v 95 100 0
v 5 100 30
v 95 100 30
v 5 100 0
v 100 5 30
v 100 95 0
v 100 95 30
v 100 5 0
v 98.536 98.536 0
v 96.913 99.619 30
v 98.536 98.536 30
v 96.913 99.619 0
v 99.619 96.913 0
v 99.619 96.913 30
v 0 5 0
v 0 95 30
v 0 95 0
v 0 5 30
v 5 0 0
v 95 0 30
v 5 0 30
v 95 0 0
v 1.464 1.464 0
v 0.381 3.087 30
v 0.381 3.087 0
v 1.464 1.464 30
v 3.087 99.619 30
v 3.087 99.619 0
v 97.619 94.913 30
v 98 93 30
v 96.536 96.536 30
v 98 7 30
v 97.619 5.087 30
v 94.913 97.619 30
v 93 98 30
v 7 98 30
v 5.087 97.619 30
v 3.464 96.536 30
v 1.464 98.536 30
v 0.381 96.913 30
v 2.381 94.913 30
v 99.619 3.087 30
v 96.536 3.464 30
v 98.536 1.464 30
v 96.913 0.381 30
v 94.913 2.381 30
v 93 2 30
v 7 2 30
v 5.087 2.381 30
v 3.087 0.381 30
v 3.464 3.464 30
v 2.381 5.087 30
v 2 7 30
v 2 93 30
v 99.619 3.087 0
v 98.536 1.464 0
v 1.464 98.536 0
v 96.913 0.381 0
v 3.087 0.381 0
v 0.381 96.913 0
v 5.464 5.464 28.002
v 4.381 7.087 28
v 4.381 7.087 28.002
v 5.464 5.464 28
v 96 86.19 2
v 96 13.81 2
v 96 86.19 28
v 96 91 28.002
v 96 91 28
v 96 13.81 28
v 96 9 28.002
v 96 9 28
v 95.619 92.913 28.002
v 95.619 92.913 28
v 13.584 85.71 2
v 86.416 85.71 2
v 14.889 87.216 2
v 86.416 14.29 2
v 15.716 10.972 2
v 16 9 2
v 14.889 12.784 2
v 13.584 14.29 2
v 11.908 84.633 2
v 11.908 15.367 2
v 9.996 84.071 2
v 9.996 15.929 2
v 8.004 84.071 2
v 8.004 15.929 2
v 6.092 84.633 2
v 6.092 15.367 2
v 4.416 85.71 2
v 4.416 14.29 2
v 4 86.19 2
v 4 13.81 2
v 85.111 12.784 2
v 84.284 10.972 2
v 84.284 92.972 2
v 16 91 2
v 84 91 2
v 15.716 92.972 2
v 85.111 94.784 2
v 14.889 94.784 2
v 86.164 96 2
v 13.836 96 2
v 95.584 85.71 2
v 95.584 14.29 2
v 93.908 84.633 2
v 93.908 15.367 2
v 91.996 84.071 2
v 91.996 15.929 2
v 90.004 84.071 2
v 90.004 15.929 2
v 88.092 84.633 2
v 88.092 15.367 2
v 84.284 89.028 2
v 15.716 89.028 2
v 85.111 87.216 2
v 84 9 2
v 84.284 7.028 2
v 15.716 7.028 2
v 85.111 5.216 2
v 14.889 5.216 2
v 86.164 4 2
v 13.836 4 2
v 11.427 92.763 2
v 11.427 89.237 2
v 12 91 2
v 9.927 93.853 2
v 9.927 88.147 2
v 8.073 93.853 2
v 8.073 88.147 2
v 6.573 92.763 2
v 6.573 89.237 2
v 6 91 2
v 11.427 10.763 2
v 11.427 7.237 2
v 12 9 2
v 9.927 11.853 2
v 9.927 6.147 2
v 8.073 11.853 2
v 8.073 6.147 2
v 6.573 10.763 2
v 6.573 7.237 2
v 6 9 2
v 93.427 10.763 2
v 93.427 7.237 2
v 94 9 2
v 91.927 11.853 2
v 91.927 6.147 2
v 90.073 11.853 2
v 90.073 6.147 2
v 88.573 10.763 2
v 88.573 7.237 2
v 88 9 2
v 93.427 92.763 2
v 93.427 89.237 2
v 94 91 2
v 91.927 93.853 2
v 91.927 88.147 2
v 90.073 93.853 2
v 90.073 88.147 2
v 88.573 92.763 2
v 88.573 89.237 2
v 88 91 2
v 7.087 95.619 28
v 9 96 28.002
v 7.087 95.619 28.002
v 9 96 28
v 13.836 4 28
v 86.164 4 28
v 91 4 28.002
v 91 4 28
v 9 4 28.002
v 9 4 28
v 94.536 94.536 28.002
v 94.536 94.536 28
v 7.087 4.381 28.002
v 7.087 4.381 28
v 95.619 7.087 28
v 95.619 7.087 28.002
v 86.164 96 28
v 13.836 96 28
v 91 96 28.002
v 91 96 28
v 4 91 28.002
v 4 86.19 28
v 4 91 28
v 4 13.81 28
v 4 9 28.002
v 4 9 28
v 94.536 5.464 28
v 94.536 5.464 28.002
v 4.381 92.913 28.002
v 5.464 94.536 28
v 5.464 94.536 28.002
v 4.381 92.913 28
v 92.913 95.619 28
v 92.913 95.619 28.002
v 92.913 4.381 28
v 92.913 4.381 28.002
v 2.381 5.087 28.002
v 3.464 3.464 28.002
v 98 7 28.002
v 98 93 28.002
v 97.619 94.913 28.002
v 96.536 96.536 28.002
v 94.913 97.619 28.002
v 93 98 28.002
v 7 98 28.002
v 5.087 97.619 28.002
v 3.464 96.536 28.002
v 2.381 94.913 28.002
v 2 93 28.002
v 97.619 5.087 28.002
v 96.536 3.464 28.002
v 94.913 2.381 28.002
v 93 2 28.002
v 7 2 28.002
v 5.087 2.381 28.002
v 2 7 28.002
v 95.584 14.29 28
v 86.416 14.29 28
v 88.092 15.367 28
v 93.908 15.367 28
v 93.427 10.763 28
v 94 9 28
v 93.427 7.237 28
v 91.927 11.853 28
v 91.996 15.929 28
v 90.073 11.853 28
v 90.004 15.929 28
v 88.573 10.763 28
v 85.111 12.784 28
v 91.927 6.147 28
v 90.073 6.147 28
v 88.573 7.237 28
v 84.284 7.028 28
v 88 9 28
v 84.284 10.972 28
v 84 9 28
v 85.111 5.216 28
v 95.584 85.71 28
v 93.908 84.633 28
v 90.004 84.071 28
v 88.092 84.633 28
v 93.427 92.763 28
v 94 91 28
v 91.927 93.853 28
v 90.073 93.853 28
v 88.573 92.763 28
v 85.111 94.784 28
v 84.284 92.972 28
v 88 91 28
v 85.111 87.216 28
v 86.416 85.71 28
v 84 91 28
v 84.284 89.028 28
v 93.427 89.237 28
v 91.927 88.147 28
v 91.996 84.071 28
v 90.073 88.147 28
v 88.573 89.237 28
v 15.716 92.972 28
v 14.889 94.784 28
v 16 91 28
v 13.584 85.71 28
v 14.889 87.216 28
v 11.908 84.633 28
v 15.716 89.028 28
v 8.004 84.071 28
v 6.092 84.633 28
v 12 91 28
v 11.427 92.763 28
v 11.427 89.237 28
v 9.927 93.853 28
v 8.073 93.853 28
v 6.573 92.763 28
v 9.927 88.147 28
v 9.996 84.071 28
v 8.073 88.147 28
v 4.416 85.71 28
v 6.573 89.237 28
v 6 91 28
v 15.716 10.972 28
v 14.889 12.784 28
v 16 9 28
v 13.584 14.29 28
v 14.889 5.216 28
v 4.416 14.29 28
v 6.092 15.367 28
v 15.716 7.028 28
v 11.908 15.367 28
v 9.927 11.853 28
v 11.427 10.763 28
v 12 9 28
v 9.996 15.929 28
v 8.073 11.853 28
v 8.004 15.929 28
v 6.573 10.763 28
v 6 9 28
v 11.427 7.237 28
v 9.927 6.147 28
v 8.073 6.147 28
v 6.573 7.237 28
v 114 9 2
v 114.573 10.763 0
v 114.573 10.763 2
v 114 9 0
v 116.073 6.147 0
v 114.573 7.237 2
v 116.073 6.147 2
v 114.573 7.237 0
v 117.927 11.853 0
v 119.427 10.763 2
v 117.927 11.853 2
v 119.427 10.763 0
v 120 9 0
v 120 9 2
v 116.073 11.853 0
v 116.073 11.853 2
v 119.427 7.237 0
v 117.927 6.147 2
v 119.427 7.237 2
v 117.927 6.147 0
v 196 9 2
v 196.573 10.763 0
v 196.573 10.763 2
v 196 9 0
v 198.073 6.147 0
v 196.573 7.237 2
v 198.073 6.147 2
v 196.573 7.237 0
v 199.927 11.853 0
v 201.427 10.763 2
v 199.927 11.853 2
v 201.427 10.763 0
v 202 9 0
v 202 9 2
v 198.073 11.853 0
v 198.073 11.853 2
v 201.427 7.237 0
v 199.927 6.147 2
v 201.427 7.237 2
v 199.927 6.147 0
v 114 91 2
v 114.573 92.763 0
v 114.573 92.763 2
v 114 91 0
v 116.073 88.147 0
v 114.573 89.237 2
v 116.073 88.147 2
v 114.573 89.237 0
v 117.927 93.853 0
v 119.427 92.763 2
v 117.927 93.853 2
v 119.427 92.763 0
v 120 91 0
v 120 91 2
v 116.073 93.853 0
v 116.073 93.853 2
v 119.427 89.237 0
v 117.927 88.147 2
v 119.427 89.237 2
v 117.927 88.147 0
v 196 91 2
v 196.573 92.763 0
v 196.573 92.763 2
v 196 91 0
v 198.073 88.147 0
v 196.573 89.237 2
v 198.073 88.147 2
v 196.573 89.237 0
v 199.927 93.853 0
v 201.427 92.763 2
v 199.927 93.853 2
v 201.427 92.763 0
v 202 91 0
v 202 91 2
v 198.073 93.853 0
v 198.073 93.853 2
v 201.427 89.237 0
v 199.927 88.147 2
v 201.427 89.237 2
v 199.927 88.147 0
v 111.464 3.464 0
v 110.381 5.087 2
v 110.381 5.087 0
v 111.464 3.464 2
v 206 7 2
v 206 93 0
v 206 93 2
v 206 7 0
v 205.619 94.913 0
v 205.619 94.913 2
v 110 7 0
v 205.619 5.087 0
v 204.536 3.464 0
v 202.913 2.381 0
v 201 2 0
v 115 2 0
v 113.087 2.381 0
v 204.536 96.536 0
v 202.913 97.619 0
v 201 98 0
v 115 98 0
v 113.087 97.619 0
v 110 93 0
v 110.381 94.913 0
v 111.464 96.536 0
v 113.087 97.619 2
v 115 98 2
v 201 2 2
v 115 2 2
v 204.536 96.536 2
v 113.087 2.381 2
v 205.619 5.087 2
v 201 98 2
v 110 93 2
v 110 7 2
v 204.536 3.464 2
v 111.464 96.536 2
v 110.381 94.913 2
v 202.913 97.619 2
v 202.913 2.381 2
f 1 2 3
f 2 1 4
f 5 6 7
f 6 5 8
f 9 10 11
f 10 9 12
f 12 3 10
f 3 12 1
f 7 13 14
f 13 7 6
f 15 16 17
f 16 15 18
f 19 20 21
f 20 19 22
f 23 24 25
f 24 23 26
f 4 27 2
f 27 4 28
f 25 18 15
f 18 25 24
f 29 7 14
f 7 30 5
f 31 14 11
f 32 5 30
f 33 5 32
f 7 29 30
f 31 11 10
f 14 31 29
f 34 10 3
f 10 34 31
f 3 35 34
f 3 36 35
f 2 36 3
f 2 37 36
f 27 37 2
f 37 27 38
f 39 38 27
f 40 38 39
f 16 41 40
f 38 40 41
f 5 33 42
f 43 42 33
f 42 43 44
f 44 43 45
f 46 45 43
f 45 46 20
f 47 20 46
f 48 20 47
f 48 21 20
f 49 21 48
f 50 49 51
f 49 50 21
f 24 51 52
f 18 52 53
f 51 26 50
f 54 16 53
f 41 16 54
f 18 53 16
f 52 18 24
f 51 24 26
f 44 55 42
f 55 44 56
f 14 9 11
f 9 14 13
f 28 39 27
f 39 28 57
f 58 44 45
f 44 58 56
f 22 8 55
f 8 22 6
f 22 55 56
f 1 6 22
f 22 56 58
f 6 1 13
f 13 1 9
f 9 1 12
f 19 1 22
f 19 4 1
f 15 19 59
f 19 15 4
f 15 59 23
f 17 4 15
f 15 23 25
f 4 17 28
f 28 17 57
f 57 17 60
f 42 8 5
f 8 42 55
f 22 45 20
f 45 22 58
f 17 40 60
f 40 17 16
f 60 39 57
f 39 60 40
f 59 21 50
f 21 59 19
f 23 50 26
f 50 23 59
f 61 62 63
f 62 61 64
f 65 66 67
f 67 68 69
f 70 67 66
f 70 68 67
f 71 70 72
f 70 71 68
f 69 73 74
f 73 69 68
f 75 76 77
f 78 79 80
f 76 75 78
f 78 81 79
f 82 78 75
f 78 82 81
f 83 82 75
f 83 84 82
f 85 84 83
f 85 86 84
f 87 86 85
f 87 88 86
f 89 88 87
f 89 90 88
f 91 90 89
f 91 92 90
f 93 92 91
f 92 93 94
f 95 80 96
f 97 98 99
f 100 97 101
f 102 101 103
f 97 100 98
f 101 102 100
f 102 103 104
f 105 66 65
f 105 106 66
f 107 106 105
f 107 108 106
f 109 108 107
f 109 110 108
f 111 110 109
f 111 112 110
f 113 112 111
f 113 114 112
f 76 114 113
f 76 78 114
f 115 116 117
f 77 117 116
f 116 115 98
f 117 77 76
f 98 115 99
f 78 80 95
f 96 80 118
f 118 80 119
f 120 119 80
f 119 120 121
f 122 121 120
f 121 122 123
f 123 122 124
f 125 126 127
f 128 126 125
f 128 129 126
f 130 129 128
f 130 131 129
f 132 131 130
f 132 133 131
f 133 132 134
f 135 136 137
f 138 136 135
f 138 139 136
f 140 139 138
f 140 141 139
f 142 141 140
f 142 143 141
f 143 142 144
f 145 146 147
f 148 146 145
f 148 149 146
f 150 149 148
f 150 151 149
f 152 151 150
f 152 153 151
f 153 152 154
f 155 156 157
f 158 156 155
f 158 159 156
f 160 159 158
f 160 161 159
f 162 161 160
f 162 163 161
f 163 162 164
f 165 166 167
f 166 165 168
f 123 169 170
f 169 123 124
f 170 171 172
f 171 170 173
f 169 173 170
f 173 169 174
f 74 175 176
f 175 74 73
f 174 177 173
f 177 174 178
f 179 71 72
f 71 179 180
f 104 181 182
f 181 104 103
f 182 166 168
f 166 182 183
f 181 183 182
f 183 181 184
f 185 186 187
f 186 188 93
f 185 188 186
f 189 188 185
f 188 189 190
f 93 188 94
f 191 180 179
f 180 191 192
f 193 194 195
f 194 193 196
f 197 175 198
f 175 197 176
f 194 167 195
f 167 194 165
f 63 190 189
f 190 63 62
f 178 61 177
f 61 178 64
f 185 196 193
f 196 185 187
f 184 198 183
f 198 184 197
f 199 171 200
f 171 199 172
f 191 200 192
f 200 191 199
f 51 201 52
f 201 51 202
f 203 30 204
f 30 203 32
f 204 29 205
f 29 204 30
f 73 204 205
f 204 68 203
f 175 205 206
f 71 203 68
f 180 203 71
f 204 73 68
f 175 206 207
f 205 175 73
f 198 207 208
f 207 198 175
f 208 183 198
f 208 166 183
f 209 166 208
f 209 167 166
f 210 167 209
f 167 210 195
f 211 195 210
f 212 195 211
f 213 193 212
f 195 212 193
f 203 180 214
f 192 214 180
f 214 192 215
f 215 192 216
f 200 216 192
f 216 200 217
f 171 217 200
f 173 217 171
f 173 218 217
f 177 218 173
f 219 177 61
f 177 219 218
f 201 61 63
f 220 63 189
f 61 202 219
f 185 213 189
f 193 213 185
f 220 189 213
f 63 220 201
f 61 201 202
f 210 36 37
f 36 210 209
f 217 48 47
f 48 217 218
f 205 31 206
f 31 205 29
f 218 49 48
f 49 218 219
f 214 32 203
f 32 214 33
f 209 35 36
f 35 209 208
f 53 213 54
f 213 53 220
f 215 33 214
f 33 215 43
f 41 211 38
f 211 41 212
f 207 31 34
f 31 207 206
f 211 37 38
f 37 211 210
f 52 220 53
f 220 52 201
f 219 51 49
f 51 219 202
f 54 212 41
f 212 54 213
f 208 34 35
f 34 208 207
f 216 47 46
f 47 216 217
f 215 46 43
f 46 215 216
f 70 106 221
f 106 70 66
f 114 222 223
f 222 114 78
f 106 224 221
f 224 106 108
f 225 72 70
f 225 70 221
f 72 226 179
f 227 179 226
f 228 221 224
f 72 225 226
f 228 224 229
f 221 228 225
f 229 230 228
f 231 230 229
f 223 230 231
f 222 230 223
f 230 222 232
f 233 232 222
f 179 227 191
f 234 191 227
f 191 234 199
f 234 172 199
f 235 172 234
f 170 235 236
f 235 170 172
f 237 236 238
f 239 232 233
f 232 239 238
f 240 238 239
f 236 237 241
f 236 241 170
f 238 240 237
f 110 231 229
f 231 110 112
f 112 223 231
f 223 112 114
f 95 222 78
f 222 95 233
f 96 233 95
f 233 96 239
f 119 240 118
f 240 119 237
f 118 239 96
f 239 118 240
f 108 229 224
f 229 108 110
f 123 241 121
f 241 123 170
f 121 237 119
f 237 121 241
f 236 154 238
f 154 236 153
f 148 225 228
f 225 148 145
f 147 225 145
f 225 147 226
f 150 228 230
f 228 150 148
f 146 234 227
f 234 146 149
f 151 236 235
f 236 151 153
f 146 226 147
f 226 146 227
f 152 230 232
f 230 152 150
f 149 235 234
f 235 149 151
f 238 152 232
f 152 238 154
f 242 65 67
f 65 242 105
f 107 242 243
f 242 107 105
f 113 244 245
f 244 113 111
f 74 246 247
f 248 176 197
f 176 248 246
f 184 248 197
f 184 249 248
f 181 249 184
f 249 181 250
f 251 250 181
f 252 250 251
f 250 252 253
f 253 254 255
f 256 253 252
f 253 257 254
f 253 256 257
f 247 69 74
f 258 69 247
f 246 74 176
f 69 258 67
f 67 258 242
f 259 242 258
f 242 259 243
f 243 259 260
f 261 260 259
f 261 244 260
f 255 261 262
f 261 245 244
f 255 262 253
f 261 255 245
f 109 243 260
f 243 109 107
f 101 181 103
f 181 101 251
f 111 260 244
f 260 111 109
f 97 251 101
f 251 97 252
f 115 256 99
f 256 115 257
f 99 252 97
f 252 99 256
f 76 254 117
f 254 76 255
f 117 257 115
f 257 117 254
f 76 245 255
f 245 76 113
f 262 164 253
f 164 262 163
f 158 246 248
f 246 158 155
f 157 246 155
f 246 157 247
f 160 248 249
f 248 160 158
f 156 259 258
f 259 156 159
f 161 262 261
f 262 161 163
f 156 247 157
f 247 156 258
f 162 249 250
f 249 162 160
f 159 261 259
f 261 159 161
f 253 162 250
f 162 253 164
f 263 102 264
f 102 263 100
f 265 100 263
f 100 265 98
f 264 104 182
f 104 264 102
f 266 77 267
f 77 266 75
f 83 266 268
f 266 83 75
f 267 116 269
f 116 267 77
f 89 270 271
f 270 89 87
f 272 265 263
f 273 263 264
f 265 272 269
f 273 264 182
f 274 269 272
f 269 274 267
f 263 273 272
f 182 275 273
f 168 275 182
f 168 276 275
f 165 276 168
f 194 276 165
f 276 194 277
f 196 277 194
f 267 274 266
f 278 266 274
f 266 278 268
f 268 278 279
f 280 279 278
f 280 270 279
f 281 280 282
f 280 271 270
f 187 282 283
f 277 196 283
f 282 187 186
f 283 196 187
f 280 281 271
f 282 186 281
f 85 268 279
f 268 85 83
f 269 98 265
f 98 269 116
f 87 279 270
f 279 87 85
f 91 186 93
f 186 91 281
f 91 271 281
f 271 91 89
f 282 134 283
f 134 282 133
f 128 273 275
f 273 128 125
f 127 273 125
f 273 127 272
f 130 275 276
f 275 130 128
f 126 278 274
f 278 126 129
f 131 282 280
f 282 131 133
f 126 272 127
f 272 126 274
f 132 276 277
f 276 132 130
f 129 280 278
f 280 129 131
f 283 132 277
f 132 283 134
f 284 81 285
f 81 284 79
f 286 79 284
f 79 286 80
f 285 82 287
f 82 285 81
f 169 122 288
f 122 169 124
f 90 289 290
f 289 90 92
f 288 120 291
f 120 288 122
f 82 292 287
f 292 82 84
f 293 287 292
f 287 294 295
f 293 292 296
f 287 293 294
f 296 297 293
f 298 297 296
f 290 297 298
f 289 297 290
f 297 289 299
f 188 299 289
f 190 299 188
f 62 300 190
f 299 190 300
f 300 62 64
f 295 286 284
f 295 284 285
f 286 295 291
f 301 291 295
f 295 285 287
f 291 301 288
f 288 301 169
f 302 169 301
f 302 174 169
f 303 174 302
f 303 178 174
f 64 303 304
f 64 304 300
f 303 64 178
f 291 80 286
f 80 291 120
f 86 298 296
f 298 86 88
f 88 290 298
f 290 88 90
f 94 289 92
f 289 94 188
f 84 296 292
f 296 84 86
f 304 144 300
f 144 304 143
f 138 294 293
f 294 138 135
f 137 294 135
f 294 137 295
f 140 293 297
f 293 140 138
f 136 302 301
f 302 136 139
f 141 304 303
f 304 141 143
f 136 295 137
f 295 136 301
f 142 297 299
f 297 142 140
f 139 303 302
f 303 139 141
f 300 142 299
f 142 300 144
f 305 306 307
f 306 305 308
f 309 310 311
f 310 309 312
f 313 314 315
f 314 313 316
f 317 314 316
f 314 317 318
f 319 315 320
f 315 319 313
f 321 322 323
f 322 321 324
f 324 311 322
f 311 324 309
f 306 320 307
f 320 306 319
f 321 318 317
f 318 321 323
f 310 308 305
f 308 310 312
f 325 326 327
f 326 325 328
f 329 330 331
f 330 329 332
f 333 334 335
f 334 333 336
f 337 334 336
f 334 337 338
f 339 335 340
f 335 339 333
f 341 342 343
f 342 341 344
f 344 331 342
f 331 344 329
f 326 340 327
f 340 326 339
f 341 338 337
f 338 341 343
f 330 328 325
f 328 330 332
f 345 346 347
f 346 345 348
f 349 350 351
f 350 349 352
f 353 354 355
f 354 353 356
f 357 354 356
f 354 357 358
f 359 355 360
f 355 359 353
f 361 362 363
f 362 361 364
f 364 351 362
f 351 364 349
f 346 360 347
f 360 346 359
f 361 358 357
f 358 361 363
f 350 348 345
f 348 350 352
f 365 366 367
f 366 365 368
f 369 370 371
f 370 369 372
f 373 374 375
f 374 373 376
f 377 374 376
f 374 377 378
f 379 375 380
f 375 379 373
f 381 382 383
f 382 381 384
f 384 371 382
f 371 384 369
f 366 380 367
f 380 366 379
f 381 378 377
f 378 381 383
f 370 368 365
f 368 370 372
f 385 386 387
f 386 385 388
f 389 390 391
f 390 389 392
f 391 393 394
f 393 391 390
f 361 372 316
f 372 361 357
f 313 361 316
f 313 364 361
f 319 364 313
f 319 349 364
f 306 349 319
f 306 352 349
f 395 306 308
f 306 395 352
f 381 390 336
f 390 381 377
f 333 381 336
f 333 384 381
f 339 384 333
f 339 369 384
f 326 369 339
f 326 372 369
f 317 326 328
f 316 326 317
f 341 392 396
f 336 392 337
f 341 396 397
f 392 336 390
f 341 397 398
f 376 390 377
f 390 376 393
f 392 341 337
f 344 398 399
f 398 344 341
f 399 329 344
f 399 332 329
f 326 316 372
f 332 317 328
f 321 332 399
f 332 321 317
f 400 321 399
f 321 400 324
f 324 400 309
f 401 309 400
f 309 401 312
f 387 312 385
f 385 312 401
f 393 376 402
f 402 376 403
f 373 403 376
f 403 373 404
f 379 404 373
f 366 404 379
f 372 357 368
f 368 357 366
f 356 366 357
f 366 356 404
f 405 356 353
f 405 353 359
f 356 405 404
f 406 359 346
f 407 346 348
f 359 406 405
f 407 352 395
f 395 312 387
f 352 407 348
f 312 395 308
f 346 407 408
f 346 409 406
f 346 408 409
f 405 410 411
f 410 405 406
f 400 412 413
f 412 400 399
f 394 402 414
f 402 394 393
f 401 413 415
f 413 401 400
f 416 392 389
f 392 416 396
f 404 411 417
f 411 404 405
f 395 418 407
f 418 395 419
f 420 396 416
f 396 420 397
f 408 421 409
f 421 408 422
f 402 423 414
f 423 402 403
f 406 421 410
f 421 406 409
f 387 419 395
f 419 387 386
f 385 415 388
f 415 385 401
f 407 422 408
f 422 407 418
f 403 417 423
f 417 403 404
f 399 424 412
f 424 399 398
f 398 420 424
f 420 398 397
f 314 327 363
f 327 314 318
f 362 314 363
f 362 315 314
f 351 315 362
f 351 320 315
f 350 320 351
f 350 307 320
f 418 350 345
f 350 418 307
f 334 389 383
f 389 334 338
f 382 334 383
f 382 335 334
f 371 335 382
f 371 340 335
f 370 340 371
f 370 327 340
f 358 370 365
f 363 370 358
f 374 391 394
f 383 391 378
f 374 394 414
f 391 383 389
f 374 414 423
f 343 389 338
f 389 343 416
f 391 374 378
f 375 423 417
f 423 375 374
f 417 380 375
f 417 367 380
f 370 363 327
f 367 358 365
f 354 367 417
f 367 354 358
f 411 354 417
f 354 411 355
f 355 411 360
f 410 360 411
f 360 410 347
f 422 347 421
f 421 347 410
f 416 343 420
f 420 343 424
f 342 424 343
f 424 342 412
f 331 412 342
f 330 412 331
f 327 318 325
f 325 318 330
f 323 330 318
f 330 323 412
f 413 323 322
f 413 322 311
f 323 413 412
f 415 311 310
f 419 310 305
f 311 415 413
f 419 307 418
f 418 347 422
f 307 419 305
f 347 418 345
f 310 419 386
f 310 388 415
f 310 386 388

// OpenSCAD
box_z = 30;
box_x = 100;
box_y = 100;
thick = 2;
corner_r = 5;
d = 0.002; // slight adjustments for differences
screw_r = 3;

module rounded_box (x,y,z,r) {
    hull() {
        translate([r, r, 0])
            cylinder(h=z, r=r, center=false);
        translate([x-r, r, 0])
            cylinder(h=z, r=r, center=false);
        translate([x-r, y-r, 0])
            cylinder(h=z, r=r, center=false);
        translate([r, y-r, 0])
            cylinder(h=z, r=r, center=false);
    }
}


module hollow_box(x, y, z, r, t) {
    difference() {
        rounded_box(x, y, z, r);
        translate([t,t,t+d])
            rounded_box(x-t-t, y-t-t, z-t, r);
    }
}

module hollow_box_for_lid(x, y, z, r, t, screw_r) {
    difference() {
        rounded_box(x, y, z, r);
        translate([2*t, 2*t, t])
            rounded_box(x-(4*t), y-(4*t), z-t, r);
        translate([t, t, z-t+d])
            rounded_box(x-(2*t), y-(2*t), z-t, r);
    }
    color("red") {
        translate([x-(t+t+t+screw_r), t+t+t+screw_r, 0]) {
            difference() {
                cylinder(h=z-t, r=screw_r+t+t, center=false);
                translate([0,0,d]) cylinder(h=z-t, r=screw_r, center=false);
            }
        }
        translate([x-(t+t+t+screw_r), y-(t+t+t+screw_r), 0]) {
            difference() {
                cylinder(h=z-t, r=screw_r+t+t, center=false);
                translate([0,0,d]) cylinder(h=z-t, r=screw_r, center=false);
            }
        }
        translate([t+t+t+screw_r, y-(t+t+t+screw_r), 0]) {
            difference() {
                cylinder(h=z-t, r=screw_r+t+t, center=false);
                translate([0,0,d]) cylinder(h=z-t, r=screw_r, center=false);
            }
        }
        translate([t+t+t+screw_r, t+t+t+screw_r, 0]) {
            difference() {
                cylinder(h=z-t, r=screw_r+t+t, center=false);
                translate([0,0,d]) cylinder(h=z-t, r=screw_r, center=false);
            }
        }
    }
}

module lid_for_hollow_box(x, y, r, t, screw_r) {
    difference() {
        lid_x = x-(2*t);
        lid_y = y-(2*t);
        rounded_box(lid_x, lid_y, t, r);
        color("red") {
            x_off = (2*t) + screw_r;
            y_off = (2*t) + screw_r;
            translate([x_off, y_off, -1*d]) {
                cylinder(h=t+d+d, r=screw_r, center=false);
            }
            translate([lid_x-x_off, y_off, -1*d]) {
                cylinder(h=t+d+d, r=screw_r, center=false);
            }
            translate([x_off, lid_y-y_off, -1*d]) {
                cylinder(h=t+d+d, r=screw_r, center=false);
            }
            translate([lid_x-x_off, lid_y-y_off, -1*d]) {
                cylinder(h=t+d+d, r=screw_r, center=false);
            }
        }
    }
}

hollow_box_for_lid(box_x, box_y, box_z, corner_r, thick, screw_r);

translate([10+box_x, thick, 0]) {
    lid_for_hollow_box(box_x, box_y, corner_r, thick, screw_r);
}
